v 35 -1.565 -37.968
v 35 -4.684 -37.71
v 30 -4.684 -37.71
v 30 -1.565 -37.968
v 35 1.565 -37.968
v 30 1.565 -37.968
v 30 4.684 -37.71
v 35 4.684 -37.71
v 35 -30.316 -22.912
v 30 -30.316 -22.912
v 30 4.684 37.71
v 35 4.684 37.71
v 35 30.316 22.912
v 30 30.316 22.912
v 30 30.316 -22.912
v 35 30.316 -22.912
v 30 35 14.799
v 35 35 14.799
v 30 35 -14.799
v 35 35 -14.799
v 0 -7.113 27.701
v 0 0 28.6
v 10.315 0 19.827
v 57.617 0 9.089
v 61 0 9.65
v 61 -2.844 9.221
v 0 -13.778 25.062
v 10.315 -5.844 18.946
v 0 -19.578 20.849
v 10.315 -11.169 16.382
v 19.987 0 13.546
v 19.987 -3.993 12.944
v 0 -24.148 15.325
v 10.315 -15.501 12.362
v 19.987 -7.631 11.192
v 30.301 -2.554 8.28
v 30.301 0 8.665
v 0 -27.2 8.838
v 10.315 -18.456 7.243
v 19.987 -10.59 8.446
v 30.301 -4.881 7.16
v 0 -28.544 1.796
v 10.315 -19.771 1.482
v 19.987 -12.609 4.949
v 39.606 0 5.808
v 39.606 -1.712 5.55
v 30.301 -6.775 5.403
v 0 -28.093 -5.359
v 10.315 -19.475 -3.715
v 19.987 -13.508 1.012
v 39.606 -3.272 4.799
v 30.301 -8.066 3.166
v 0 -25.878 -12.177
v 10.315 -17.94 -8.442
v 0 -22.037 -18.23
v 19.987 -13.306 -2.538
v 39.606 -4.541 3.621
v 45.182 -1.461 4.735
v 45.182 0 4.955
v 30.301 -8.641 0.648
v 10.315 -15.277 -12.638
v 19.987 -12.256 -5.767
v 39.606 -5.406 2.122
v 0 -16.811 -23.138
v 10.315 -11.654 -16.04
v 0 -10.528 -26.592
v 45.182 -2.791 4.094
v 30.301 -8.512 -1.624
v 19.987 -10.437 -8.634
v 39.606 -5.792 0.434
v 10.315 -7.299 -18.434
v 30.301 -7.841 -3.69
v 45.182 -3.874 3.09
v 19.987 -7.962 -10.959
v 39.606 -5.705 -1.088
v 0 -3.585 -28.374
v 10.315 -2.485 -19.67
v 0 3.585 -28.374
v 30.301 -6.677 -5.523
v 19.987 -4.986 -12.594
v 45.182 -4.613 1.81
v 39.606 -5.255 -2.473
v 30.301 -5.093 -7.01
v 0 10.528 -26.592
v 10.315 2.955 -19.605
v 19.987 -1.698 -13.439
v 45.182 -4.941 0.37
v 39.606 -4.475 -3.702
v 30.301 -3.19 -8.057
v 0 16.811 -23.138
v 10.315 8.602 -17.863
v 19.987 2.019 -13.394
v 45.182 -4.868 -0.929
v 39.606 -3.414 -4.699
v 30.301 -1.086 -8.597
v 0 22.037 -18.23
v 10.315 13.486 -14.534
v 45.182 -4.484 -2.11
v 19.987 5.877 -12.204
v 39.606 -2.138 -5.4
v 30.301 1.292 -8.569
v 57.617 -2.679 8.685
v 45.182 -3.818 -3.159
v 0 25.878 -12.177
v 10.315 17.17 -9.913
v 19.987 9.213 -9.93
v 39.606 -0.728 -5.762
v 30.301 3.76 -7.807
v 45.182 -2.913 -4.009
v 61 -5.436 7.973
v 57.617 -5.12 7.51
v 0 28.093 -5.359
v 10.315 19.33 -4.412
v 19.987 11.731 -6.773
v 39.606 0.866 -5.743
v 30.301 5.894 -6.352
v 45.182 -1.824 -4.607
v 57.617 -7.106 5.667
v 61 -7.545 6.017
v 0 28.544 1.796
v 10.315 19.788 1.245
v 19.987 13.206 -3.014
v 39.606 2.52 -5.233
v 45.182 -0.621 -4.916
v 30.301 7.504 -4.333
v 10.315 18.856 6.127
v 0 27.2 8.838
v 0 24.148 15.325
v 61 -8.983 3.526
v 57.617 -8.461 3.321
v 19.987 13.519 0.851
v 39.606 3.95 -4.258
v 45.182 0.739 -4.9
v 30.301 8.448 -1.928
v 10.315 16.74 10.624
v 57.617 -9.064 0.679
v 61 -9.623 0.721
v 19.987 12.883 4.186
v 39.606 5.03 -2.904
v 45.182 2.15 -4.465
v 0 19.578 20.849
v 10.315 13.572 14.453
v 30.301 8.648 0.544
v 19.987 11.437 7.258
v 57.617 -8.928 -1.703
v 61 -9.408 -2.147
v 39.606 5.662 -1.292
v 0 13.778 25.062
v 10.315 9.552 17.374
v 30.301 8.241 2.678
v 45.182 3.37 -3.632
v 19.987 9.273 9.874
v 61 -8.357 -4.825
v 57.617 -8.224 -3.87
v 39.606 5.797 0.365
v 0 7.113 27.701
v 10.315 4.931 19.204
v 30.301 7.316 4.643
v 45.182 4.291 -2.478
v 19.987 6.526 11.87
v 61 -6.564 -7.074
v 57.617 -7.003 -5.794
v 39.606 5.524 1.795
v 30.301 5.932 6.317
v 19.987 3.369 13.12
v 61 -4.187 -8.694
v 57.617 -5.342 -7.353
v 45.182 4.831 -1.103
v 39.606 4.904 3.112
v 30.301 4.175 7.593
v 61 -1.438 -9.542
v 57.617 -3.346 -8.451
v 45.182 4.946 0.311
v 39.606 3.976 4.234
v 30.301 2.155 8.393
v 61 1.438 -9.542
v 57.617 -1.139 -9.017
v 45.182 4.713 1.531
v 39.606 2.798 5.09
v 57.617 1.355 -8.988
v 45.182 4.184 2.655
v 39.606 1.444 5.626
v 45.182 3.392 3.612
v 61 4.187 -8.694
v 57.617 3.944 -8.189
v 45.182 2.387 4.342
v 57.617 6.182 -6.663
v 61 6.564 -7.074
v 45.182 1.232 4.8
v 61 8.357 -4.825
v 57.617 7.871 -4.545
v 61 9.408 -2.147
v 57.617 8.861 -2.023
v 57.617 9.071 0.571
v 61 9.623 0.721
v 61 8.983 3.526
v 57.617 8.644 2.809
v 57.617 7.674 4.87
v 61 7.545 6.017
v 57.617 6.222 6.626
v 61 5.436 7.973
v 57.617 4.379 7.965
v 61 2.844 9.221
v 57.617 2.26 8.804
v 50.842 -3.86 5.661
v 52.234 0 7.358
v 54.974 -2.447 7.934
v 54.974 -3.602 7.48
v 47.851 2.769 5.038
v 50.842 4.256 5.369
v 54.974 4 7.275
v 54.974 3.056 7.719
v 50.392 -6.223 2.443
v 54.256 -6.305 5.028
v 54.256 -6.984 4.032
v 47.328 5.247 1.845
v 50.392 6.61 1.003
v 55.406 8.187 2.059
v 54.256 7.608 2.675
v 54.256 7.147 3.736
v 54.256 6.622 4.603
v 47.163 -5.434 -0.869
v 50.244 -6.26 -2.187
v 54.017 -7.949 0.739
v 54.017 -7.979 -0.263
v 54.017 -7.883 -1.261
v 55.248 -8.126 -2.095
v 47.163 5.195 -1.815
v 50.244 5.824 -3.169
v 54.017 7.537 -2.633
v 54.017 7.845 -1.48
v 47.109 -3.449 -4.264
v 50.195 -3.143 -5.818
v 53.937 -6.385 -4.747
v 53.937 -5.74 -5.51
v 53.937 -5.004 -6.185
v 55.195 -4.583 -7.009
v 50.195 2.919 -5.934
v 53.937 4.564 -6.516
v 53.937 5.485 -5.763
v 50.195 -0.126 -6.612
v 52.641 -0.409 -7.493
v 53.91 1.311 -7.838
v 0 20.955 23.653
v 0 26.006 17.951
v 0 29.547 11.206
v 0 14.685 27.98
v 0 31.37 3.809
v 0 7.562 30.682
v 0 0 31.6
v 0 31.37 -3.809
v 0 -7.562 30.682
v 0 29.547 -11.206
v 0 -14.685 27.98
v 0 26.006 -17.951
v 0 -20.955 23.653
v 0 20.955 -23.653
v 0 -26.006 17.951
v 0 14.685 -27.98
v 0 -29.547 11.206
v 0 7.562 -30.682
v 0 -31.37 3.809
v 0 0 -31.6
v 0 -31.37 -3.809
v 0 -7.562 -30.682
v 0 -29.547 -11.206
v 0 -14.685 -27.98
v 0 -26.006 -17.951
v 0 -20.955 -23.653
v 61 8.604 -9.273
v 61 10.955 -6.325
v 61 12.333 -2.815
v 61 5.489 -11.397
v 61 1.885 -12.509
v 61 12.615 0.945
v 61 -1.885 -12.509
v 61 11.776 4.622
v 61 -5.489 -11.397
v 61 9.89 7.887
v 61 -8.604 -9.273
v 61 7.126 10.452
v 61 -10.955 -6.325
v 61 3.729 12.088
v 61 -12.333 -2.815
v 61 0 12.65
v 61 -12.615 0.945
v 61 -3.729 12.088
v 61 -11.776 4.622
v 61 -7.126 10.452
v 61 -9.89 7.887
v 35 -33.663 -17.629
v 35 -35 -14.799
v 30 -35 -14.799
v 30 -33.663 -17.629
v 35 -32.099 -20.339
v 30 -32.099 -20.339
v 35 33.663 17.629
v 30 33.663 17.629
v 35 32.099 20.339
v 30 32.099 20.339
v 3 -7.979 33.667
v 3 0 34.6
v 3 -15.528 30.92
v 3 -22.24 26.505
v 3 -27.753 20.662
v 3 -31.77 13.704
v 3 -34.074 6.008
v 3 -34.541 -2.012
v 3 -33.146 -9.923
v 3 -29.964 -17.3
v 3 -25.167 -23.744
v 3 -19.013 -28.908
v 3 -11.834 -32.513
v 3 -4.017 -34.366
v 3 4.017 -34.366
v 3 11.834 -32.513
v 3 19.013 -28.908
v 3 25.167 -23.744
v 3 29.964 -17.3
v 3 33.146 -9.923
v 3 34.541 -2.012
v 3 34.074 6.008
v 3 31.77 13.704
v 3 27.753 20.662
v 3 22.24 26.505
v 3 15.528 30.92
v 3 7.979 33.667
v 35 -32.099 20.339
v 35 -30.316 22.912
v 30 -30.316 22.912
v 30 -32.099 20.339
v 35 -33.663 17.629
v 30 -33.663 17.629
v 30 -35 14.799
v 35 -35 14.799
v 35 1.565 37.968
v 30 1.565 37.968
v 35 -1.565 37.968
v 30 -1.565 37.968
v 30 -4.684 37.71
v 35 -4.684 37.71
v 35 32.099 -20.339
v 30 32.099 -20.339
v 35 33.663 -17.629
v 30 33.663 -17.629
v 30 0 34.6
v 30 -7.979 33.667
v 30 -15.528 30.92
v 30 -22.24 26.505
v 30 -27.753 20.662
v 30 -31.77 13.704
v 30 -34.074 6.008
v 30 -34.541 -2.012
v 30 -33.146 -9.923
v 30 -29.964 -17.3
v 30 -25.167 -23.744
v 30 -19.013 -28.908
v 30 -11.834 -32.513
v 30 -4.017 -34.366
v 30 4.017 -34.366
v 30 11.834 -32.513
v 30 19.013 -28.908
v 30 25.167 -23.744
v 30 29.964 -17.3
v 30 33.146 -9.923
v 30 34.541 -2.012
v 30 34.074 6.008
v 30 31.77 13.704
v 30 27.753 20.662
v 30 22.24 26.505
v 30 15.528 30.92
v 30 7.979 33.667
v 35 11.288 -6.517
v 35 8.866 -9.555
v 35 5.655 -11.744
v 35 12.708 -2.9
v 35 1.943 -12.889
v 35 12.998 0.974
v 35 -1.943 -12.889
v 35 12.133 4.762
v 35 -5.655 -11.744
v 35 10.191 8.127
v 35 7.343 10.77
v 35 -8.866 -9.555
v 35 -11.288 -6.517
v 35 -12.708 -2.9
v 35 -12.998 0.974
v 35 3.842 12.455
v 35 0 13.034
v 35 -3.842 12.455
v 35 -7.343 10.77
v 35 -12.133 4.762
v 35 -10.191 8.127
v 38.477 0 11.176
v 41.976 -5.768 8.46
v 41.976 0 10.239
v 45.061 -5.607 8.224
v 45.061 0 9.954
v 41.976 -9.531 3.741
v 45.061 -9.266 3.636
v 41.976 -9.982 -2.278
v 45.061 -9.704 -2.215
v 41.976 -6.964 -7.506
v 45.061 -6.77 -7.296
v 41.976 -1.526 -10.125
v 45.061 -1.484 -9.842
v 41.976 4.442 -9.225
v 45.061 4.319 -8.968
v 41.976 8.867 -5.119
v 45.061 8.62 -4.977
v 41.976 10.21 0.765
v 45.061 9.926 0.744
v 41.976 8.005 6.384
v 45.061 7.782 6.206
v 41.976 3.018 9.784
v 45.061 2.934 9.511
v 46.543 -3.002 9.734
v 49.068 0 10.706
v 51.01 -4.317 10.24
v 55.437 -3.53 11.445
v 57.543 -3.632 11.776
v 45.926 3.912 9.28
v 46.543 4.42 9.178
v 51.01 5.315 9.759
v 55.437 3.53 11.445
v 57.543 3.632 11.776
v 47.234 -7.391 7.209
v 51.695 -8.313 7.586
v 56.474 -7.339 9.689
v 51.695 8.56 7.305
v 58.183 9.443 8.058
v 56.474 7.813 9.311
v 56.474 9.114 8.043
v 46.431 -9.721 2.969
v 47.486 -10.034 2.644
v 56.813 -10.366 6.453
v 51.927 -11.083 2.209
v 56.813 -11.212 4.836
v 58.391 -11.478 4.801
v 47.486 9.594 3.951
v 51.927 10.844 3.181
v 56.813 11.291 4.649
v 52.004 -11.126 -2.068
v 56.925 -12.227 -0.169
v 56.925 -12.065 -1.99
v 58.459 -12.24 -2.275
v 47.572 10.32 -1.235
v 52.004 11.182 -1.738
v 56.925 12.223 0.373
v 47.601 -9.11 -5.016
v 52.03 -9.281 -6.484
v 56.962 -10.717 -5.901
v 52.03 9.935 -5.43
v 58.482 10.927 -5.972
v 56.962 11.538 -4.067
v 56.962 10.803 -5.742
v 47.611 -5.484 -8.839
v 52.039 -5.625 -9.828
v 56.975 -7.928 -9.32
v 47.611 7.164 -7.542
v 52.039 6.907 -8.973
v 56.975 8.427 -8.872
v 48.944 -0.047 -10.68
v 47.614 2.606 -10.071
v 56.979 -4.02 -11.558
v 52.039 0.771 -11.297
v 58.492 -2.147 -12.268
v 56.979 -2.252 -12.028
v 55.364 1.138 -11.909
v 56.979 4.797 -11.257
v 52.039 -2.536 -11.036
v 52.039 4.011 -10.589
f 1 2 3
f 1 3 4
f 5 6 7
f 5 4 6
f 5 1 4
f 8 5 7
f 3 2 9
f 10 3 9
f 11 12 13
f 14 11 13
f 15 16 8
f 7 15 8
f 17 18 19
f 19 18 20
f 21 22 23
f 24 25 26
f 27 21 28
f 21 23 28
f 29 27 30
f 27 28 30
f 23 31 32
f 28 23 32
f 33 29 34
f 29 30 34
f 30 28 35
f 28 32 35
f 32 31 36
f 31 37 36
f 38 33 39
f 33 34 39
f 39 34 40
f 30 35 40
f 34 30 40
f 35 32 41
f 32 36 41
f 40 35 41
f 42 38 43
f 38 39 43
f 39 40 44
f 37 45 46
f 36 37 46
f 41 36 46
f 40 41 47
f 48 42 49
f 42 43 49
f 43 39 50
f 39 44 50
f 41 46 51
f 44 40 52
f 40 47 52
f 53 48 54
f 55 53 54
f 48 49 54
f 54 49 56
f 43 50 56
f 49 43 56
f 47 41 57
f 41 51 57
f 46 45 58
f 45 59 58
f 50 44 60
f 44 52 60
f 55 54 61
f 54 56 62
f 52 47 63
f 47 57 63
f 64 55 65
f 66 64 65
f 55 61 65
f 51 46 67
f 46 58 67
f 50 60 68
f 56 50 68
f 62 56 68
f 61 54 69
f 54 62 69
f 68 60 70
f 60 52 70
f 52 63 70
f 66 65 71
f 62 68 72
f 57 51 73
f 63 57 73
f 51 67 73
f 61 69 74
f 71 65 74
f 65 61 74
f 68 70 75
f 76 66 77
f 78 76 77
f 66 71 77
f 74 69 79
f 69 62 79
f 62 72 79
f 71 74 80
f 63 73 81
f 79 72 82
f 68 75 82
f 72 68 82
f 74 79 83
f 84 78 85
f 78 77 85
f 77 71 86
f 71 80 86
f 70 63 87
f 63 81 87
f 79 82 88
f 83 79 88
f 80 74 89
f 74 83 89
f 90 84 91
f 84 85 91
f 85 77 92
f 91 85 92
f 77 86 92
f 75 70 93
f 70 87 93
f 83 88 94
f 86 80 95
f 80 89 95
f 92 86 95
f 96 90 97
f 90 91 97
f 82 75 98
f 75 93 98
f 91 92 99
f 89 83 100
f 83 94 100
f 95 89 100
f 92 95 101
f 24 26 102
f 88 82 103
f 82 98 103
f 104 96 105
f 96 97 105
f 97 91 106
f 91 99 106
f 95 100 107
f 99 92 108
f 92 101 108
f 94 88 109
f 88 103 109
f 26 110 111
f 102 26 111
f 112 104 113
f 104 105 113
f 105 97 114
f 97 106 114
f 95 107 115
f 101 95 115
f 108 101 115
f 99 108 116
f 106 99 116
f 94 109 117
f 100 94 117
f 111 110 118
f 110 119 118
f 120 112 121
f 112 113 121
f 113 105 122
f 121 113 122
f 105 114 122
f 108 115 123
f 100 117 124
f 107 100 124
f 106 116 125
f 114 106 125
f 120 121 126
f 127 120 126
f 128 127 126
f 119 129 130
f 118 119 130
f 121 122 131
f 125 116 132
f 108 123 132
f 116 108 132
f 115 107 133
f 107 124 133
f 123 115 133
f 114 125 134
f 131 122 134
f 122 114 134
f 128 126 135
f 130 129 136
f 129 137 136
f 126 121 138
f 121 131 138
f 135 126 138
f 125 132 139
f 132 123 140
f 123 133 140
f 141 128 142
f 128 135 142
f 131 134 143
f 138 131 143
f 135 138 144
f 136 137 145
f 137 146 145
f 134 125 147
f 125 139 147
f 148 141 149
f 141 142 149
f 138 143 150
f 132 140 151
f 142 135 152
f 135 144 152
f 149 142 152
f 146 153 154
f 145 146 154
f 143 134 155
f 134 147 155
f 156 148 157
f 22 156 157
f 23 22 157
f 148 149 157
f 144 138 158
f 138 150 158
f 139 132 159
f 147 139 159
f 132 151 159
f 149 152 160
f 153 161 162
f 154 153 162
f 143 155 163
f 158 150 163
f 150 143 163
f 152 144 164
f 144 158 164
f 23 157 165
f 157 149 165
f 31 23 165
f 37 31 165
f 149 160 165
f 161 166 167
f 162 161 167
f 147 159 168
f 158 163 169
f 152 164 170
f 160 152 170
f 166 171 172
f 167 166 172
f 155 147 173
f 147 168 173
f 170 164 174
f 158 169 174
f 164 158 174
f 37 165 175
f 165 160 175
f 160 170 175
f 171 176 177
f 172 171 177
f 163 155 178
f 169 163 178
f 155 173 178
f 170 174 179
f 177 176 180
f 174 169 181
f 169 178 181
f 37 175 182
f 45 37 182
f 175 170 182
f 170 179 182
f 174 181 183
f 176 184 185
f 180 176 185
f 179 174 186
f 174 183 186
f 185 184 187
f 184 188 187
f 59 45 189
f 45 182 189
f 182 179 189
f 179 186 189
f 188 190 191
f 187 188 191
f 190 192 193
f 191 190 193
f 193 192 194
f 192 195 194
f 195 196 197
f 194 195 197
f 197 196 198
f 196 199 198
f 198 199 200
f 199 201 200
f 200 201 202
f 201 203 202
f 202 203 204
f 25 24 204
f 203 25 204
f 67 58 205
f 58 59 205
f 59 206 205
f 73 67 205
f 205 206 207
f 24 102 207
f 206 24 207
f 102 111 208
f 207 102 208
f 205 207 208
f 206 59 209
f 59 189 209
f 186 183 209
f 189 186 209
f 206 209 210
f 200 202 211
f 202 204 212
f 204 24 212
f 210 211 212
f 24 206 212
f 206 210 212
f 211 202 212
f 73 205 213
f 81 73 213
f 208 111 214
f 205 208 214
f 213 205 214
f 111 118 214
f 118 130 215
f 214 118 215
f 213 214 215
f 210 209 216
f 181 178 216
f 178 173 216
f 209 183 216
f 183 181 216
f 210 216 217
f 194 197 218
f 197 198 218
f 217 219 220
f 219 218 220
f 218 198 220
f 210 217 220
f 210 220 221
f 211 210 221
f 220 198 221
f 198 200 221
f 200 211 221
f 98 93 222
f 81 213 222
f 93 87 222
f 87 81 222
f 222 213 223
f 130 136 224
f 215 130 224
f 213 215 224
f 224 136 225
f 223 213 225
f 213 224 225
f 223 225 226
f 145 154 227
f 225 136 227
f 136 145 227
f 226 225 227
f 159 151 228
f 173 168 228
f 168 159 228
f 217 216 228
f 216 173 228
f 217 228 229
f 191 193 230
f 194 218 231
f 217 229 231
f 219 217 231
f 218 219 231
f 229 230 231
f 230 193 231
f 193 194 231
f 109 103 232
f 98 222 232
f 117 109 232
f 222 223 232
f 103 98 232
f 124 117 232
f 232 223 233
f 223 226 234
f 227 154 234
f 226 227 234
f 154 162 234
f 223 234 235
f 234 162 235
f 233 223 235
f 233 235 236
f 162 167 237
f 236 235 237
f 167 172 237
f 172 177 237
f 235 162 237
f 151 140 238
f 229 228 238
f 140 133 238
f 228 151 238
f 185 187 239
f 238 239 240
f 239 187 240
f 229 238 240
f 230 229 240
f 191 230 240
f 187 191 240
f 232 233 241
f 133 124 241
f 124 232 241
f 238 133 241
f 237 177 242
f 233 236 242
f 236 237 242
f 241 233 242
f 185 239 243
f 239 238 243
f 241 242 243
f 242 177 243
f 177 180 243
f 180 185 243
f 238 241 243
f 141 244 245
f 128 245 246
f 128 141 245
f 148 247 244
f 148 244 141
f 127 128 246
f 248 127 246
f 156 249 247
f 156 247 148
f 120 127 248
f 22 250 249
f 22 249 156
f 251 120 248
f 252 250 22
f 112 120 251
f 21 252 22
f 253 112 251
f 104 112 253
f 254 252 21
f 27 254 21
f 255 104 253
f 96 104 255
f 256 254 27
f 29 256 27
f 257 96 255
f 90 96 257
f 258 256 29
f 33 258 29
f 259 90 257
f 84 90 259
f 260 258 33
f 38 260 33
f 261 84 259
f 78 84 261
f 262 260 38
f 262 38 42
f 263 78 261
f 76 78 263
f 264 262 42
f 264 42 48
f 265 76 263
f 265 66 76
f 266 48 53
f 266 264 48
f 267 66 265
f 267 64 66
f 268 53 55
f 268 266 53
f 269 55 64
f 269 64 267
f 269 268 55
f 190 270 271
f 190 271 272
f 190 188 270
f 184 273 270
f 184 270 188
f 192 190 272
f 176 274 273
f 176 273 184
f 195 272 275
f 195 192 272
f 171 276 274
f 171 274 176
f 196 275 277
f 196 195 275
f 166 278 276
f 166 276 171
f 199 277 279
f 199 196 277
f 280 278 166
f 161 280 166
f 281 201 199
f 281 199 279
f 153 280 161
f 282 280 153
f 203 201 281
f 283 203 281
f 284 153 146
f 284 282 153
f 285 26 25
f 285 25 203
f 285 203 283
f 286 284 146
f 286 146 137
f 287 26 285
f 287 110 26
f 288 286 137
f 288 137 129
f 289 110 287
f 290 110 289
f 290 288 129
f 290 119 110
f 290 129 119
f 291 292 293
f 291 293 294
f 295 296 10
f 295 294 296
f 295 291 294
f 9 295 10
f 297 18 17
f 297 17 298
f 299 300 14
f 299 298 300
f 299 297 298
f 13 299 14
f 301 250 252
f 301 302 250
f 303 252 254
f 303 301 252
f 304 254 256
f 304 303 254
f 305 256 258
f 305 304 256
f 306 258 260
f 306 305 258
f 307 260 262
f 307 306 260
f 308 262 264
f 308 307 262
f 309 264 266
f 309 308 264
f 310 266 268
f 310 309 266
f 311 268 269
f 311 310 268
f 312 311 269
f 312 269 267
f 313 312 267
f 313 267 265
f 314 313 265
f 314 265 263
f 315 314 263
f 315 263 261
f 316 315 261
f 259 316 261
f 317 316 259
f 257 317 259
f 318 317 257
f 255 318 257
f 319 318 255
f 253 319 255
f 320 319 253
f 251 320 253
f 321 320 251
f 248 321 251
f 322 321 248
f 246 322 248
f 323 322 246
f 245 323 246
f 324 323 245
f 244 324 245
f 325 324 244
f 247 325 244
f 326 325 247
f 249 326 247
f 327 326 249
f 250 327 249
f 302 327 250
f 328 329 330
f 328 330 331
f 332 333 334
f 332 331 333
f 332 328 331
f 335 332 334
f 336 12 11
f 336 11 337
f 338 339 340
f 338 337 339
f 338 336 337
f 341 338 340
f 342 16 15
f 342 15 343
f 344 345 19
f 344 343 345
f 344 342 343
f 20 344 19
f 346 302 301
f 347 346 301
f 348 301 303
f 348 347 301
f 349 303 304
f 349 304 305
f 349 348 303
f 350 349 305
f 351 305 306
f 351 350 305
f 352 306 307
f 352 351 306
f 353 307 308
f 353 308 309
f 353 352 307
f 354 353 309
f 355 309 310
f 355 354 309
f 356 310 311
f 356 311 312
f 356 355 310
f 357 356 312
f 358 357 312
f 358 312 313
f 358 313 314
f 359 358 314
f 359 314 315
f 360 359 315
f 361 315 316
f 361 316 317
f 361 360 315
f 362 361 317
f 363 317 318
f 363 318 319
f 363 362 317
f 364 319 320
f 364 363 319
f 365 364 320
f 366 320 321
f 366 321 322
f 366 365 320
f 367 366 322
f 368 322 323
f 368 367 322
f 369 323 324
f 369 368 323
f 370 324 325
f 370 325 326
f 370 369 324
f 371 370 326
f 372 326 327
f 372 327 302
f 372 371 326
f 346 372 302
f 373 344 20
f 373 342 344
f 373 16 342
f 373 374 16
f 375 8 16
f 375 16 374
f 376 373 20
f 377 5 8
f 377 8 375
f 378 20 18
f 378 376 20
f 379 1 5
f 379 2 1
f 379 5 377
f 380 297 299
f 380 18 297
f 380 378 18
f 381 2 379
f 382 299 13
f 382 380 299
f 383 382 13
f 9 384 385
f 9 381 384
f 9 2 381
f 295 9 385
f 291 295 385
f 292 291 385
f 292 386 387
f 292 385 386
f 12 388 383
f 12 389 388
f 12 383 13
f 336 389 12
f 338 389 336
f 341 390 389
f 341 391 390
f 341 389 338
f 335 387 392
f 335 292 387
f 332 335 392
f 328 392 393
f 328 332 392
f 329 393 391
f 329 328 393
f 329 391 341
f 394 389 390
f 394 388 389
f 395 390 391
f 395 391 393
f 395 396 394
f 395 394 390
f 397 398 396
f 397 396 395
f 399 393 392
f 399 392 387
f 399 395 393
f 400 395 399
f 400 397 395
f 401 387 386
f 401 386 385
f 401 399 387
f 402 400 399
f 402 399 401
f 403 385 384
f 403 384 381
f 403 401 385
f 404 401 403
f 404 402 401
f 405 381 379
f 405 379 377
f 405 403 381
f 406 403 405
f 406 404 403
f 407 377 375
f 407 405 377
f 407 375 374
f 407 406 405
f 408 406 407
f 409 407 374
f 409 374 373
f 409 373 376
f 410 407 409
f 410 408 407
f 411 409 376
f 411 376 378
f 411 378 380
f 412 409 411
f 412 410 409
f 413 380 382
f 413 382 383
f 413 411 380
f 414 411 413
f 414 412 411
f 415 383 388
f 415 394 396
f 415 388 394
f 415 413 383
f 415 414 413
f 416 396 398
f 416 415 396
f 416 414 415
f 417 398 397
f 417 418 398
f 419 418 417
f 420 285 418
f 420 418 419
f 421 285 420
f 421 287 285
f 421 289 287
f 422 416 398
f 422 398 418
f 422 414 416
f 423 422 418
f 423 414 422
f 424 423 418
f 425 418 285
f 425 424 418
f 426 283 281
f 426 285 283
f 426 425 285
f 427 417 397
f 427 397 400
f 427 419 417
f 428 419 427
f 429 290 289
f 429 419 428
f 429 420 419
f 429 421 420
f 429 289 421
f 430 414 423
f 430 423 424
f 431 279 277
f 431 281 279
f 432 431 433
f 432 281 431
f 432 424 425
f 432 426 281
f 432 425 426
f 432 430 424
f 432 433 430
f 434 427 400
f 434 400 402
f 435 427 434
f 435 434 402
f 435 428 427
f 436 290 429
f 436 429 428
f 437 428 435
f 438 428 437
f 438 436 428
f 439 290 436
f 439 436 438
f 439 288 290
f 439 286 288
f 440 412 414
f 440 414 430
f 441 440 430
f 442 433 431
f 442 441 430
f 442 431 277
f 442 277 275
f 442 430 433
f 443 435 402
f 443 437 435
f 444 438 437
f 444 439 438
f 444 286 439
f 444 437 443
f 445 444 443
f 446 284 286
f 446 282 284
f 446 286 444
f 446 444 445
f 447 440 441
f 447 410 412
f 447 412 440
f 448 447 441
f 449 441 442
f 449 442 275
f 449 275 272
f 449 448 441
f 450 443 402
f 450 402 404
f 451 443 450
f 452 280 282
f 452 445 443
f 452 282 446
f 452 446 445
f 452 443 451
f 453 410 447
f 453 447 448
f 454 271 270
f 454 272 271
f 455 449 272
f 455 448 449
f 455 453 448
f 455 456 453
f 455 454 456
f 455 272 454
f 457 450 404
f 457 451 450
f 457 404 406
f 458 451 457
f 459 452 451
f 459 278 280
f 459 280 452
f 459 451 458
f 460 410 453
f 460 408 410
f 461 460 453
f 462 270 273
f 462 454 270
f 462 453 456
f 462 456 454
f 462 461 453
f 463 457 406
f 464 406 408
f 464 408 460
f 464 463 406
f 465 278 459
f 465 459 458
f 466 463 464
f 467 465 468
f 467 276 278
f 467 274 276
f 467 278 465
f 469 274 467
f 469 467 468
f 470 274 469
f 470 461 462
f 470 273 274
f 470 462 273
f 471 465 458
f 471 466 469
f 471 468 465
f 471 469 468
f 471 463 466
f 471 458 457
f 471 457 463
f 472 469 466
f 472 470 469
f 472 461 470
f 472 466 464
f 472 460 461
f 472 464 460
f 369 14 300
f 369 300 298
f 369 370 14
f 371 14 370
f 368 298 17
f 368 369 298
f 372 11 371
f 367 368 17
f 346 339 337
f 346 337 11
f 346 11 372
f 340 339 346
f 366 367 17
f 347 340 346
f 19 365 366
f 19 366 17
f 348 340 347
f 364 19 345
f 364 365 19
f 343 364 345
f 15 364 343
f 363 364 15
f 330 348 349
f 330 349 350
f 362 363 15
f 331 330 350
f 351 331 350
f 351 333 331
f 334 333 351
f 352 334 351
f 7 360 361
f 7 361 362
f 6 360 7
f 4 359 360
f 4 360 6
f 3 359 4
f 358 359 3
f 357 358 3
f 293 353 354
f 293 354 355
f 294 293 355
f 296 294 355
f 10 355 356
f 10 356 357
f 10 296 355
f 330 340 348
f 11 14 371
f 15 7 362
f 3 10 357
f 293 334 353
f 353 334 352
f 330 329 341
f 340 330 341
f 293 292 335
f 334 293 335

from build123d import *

# Parameters (mm, degrees)
CORTE_EXTRUS_O1_REACH = 66.133
PADR_OCIRCULAR1_COUNT = 6


with BuildPart() as part:
    # Esboço5 → Revolução2 (revolve)
    with BuildSketch(Plane(origin=(0, 0, 0), x_dir=(1, 0, 0), z_dir=(0, 1, 0)), mode=Mode.PRIVATE) as revolu_o2_sk:
        with BuildLine():
            Line((30, 34.6), (30, 38))
            Line((30, 38), (35, 38))
            Line((35, 38), (35, 13.034480978))
            add(Edge.make_bspline(
                [(35, 13.034480978), (38.108675957, 10.648534591), (43.835508458, 9.861753235), (46.598549995, 10.040745389), (57.264939348, 12.650201836), (61, 12.65)],
                knots=[0, 0, 0, 0, 0.39411742, 0.49411742, 1, 1, 1, 1], degree=3))
            Line((61, 12.65), (61, 9.65))
            add(Edge.make_bspline(
                [(0, 28.6), (20.31391897, 8.95615601), (43.784583373, 4.835357072), (46.678252365, 5.00429716), (57.291609233, 9.661966126), (61, 9.65)],
                knots=[0, 0, 0, 0, 0.416422234, 0.516422234, 1, 1, 1, 1], degree=3))
            Line((0, 28.6), (0, 31.6))
            Line((0, 31.6), (3, 34.6))
            Line((3, 34.6), (30, 34.6))
        make_face()
    revolve(revolu_o2_sk.sketch.rotate(Axis((0, 0, 0), (1, 0, 0)), 180), axis=Axis((0, 0, 0), (1, 0, 0)))

    # Esboço30 → Corte-extrusão1 (cut, up to next)
    with BuildSketch(Plane(origin=(35, 0, 0), x_dir=(0, 0, -1), z_dir=(1, 0, 0)), mode=Mode.PRIVATE) as corte_extrus_o1_sk1:
        with BuildLine():
            Line((-14.798648587, 35), (14.798648587, 35))
            ThreePointArc((14.798648587, 35), (0, 38), (-14.798648587, 35))
        make_face()
    corte_extrus_o1_tool1 = extrude(corte_extrus_o1_sk1.sketch, amount=-CORTE_EXTRUS_O1_REACH, mode=Mode.PRIVATE) & part.part
    corte_extrus_o1 = corte_extrus_o1_tool1.solids().sort_by_distance((35, 36.204155, 0))[0]
    add(corte_extrus_o1, mode=Mode.SUBTRACT)

    # PadrãoCircular1: Corte-extrusão1 ×6 about axis
    padr_ocircular1_axis = Axis((0, 0, 0), (1, 0, 0))
    for i in range(1, PADR_OCIRCULAR1_COUNT):
        add(corte_extrus_o1.rotate(padr_ocircular1_axis, i * 360 / PADR_OCIRCULAR1_COUNT), mode=Mode.SUBTRACT)


solid = part.part
